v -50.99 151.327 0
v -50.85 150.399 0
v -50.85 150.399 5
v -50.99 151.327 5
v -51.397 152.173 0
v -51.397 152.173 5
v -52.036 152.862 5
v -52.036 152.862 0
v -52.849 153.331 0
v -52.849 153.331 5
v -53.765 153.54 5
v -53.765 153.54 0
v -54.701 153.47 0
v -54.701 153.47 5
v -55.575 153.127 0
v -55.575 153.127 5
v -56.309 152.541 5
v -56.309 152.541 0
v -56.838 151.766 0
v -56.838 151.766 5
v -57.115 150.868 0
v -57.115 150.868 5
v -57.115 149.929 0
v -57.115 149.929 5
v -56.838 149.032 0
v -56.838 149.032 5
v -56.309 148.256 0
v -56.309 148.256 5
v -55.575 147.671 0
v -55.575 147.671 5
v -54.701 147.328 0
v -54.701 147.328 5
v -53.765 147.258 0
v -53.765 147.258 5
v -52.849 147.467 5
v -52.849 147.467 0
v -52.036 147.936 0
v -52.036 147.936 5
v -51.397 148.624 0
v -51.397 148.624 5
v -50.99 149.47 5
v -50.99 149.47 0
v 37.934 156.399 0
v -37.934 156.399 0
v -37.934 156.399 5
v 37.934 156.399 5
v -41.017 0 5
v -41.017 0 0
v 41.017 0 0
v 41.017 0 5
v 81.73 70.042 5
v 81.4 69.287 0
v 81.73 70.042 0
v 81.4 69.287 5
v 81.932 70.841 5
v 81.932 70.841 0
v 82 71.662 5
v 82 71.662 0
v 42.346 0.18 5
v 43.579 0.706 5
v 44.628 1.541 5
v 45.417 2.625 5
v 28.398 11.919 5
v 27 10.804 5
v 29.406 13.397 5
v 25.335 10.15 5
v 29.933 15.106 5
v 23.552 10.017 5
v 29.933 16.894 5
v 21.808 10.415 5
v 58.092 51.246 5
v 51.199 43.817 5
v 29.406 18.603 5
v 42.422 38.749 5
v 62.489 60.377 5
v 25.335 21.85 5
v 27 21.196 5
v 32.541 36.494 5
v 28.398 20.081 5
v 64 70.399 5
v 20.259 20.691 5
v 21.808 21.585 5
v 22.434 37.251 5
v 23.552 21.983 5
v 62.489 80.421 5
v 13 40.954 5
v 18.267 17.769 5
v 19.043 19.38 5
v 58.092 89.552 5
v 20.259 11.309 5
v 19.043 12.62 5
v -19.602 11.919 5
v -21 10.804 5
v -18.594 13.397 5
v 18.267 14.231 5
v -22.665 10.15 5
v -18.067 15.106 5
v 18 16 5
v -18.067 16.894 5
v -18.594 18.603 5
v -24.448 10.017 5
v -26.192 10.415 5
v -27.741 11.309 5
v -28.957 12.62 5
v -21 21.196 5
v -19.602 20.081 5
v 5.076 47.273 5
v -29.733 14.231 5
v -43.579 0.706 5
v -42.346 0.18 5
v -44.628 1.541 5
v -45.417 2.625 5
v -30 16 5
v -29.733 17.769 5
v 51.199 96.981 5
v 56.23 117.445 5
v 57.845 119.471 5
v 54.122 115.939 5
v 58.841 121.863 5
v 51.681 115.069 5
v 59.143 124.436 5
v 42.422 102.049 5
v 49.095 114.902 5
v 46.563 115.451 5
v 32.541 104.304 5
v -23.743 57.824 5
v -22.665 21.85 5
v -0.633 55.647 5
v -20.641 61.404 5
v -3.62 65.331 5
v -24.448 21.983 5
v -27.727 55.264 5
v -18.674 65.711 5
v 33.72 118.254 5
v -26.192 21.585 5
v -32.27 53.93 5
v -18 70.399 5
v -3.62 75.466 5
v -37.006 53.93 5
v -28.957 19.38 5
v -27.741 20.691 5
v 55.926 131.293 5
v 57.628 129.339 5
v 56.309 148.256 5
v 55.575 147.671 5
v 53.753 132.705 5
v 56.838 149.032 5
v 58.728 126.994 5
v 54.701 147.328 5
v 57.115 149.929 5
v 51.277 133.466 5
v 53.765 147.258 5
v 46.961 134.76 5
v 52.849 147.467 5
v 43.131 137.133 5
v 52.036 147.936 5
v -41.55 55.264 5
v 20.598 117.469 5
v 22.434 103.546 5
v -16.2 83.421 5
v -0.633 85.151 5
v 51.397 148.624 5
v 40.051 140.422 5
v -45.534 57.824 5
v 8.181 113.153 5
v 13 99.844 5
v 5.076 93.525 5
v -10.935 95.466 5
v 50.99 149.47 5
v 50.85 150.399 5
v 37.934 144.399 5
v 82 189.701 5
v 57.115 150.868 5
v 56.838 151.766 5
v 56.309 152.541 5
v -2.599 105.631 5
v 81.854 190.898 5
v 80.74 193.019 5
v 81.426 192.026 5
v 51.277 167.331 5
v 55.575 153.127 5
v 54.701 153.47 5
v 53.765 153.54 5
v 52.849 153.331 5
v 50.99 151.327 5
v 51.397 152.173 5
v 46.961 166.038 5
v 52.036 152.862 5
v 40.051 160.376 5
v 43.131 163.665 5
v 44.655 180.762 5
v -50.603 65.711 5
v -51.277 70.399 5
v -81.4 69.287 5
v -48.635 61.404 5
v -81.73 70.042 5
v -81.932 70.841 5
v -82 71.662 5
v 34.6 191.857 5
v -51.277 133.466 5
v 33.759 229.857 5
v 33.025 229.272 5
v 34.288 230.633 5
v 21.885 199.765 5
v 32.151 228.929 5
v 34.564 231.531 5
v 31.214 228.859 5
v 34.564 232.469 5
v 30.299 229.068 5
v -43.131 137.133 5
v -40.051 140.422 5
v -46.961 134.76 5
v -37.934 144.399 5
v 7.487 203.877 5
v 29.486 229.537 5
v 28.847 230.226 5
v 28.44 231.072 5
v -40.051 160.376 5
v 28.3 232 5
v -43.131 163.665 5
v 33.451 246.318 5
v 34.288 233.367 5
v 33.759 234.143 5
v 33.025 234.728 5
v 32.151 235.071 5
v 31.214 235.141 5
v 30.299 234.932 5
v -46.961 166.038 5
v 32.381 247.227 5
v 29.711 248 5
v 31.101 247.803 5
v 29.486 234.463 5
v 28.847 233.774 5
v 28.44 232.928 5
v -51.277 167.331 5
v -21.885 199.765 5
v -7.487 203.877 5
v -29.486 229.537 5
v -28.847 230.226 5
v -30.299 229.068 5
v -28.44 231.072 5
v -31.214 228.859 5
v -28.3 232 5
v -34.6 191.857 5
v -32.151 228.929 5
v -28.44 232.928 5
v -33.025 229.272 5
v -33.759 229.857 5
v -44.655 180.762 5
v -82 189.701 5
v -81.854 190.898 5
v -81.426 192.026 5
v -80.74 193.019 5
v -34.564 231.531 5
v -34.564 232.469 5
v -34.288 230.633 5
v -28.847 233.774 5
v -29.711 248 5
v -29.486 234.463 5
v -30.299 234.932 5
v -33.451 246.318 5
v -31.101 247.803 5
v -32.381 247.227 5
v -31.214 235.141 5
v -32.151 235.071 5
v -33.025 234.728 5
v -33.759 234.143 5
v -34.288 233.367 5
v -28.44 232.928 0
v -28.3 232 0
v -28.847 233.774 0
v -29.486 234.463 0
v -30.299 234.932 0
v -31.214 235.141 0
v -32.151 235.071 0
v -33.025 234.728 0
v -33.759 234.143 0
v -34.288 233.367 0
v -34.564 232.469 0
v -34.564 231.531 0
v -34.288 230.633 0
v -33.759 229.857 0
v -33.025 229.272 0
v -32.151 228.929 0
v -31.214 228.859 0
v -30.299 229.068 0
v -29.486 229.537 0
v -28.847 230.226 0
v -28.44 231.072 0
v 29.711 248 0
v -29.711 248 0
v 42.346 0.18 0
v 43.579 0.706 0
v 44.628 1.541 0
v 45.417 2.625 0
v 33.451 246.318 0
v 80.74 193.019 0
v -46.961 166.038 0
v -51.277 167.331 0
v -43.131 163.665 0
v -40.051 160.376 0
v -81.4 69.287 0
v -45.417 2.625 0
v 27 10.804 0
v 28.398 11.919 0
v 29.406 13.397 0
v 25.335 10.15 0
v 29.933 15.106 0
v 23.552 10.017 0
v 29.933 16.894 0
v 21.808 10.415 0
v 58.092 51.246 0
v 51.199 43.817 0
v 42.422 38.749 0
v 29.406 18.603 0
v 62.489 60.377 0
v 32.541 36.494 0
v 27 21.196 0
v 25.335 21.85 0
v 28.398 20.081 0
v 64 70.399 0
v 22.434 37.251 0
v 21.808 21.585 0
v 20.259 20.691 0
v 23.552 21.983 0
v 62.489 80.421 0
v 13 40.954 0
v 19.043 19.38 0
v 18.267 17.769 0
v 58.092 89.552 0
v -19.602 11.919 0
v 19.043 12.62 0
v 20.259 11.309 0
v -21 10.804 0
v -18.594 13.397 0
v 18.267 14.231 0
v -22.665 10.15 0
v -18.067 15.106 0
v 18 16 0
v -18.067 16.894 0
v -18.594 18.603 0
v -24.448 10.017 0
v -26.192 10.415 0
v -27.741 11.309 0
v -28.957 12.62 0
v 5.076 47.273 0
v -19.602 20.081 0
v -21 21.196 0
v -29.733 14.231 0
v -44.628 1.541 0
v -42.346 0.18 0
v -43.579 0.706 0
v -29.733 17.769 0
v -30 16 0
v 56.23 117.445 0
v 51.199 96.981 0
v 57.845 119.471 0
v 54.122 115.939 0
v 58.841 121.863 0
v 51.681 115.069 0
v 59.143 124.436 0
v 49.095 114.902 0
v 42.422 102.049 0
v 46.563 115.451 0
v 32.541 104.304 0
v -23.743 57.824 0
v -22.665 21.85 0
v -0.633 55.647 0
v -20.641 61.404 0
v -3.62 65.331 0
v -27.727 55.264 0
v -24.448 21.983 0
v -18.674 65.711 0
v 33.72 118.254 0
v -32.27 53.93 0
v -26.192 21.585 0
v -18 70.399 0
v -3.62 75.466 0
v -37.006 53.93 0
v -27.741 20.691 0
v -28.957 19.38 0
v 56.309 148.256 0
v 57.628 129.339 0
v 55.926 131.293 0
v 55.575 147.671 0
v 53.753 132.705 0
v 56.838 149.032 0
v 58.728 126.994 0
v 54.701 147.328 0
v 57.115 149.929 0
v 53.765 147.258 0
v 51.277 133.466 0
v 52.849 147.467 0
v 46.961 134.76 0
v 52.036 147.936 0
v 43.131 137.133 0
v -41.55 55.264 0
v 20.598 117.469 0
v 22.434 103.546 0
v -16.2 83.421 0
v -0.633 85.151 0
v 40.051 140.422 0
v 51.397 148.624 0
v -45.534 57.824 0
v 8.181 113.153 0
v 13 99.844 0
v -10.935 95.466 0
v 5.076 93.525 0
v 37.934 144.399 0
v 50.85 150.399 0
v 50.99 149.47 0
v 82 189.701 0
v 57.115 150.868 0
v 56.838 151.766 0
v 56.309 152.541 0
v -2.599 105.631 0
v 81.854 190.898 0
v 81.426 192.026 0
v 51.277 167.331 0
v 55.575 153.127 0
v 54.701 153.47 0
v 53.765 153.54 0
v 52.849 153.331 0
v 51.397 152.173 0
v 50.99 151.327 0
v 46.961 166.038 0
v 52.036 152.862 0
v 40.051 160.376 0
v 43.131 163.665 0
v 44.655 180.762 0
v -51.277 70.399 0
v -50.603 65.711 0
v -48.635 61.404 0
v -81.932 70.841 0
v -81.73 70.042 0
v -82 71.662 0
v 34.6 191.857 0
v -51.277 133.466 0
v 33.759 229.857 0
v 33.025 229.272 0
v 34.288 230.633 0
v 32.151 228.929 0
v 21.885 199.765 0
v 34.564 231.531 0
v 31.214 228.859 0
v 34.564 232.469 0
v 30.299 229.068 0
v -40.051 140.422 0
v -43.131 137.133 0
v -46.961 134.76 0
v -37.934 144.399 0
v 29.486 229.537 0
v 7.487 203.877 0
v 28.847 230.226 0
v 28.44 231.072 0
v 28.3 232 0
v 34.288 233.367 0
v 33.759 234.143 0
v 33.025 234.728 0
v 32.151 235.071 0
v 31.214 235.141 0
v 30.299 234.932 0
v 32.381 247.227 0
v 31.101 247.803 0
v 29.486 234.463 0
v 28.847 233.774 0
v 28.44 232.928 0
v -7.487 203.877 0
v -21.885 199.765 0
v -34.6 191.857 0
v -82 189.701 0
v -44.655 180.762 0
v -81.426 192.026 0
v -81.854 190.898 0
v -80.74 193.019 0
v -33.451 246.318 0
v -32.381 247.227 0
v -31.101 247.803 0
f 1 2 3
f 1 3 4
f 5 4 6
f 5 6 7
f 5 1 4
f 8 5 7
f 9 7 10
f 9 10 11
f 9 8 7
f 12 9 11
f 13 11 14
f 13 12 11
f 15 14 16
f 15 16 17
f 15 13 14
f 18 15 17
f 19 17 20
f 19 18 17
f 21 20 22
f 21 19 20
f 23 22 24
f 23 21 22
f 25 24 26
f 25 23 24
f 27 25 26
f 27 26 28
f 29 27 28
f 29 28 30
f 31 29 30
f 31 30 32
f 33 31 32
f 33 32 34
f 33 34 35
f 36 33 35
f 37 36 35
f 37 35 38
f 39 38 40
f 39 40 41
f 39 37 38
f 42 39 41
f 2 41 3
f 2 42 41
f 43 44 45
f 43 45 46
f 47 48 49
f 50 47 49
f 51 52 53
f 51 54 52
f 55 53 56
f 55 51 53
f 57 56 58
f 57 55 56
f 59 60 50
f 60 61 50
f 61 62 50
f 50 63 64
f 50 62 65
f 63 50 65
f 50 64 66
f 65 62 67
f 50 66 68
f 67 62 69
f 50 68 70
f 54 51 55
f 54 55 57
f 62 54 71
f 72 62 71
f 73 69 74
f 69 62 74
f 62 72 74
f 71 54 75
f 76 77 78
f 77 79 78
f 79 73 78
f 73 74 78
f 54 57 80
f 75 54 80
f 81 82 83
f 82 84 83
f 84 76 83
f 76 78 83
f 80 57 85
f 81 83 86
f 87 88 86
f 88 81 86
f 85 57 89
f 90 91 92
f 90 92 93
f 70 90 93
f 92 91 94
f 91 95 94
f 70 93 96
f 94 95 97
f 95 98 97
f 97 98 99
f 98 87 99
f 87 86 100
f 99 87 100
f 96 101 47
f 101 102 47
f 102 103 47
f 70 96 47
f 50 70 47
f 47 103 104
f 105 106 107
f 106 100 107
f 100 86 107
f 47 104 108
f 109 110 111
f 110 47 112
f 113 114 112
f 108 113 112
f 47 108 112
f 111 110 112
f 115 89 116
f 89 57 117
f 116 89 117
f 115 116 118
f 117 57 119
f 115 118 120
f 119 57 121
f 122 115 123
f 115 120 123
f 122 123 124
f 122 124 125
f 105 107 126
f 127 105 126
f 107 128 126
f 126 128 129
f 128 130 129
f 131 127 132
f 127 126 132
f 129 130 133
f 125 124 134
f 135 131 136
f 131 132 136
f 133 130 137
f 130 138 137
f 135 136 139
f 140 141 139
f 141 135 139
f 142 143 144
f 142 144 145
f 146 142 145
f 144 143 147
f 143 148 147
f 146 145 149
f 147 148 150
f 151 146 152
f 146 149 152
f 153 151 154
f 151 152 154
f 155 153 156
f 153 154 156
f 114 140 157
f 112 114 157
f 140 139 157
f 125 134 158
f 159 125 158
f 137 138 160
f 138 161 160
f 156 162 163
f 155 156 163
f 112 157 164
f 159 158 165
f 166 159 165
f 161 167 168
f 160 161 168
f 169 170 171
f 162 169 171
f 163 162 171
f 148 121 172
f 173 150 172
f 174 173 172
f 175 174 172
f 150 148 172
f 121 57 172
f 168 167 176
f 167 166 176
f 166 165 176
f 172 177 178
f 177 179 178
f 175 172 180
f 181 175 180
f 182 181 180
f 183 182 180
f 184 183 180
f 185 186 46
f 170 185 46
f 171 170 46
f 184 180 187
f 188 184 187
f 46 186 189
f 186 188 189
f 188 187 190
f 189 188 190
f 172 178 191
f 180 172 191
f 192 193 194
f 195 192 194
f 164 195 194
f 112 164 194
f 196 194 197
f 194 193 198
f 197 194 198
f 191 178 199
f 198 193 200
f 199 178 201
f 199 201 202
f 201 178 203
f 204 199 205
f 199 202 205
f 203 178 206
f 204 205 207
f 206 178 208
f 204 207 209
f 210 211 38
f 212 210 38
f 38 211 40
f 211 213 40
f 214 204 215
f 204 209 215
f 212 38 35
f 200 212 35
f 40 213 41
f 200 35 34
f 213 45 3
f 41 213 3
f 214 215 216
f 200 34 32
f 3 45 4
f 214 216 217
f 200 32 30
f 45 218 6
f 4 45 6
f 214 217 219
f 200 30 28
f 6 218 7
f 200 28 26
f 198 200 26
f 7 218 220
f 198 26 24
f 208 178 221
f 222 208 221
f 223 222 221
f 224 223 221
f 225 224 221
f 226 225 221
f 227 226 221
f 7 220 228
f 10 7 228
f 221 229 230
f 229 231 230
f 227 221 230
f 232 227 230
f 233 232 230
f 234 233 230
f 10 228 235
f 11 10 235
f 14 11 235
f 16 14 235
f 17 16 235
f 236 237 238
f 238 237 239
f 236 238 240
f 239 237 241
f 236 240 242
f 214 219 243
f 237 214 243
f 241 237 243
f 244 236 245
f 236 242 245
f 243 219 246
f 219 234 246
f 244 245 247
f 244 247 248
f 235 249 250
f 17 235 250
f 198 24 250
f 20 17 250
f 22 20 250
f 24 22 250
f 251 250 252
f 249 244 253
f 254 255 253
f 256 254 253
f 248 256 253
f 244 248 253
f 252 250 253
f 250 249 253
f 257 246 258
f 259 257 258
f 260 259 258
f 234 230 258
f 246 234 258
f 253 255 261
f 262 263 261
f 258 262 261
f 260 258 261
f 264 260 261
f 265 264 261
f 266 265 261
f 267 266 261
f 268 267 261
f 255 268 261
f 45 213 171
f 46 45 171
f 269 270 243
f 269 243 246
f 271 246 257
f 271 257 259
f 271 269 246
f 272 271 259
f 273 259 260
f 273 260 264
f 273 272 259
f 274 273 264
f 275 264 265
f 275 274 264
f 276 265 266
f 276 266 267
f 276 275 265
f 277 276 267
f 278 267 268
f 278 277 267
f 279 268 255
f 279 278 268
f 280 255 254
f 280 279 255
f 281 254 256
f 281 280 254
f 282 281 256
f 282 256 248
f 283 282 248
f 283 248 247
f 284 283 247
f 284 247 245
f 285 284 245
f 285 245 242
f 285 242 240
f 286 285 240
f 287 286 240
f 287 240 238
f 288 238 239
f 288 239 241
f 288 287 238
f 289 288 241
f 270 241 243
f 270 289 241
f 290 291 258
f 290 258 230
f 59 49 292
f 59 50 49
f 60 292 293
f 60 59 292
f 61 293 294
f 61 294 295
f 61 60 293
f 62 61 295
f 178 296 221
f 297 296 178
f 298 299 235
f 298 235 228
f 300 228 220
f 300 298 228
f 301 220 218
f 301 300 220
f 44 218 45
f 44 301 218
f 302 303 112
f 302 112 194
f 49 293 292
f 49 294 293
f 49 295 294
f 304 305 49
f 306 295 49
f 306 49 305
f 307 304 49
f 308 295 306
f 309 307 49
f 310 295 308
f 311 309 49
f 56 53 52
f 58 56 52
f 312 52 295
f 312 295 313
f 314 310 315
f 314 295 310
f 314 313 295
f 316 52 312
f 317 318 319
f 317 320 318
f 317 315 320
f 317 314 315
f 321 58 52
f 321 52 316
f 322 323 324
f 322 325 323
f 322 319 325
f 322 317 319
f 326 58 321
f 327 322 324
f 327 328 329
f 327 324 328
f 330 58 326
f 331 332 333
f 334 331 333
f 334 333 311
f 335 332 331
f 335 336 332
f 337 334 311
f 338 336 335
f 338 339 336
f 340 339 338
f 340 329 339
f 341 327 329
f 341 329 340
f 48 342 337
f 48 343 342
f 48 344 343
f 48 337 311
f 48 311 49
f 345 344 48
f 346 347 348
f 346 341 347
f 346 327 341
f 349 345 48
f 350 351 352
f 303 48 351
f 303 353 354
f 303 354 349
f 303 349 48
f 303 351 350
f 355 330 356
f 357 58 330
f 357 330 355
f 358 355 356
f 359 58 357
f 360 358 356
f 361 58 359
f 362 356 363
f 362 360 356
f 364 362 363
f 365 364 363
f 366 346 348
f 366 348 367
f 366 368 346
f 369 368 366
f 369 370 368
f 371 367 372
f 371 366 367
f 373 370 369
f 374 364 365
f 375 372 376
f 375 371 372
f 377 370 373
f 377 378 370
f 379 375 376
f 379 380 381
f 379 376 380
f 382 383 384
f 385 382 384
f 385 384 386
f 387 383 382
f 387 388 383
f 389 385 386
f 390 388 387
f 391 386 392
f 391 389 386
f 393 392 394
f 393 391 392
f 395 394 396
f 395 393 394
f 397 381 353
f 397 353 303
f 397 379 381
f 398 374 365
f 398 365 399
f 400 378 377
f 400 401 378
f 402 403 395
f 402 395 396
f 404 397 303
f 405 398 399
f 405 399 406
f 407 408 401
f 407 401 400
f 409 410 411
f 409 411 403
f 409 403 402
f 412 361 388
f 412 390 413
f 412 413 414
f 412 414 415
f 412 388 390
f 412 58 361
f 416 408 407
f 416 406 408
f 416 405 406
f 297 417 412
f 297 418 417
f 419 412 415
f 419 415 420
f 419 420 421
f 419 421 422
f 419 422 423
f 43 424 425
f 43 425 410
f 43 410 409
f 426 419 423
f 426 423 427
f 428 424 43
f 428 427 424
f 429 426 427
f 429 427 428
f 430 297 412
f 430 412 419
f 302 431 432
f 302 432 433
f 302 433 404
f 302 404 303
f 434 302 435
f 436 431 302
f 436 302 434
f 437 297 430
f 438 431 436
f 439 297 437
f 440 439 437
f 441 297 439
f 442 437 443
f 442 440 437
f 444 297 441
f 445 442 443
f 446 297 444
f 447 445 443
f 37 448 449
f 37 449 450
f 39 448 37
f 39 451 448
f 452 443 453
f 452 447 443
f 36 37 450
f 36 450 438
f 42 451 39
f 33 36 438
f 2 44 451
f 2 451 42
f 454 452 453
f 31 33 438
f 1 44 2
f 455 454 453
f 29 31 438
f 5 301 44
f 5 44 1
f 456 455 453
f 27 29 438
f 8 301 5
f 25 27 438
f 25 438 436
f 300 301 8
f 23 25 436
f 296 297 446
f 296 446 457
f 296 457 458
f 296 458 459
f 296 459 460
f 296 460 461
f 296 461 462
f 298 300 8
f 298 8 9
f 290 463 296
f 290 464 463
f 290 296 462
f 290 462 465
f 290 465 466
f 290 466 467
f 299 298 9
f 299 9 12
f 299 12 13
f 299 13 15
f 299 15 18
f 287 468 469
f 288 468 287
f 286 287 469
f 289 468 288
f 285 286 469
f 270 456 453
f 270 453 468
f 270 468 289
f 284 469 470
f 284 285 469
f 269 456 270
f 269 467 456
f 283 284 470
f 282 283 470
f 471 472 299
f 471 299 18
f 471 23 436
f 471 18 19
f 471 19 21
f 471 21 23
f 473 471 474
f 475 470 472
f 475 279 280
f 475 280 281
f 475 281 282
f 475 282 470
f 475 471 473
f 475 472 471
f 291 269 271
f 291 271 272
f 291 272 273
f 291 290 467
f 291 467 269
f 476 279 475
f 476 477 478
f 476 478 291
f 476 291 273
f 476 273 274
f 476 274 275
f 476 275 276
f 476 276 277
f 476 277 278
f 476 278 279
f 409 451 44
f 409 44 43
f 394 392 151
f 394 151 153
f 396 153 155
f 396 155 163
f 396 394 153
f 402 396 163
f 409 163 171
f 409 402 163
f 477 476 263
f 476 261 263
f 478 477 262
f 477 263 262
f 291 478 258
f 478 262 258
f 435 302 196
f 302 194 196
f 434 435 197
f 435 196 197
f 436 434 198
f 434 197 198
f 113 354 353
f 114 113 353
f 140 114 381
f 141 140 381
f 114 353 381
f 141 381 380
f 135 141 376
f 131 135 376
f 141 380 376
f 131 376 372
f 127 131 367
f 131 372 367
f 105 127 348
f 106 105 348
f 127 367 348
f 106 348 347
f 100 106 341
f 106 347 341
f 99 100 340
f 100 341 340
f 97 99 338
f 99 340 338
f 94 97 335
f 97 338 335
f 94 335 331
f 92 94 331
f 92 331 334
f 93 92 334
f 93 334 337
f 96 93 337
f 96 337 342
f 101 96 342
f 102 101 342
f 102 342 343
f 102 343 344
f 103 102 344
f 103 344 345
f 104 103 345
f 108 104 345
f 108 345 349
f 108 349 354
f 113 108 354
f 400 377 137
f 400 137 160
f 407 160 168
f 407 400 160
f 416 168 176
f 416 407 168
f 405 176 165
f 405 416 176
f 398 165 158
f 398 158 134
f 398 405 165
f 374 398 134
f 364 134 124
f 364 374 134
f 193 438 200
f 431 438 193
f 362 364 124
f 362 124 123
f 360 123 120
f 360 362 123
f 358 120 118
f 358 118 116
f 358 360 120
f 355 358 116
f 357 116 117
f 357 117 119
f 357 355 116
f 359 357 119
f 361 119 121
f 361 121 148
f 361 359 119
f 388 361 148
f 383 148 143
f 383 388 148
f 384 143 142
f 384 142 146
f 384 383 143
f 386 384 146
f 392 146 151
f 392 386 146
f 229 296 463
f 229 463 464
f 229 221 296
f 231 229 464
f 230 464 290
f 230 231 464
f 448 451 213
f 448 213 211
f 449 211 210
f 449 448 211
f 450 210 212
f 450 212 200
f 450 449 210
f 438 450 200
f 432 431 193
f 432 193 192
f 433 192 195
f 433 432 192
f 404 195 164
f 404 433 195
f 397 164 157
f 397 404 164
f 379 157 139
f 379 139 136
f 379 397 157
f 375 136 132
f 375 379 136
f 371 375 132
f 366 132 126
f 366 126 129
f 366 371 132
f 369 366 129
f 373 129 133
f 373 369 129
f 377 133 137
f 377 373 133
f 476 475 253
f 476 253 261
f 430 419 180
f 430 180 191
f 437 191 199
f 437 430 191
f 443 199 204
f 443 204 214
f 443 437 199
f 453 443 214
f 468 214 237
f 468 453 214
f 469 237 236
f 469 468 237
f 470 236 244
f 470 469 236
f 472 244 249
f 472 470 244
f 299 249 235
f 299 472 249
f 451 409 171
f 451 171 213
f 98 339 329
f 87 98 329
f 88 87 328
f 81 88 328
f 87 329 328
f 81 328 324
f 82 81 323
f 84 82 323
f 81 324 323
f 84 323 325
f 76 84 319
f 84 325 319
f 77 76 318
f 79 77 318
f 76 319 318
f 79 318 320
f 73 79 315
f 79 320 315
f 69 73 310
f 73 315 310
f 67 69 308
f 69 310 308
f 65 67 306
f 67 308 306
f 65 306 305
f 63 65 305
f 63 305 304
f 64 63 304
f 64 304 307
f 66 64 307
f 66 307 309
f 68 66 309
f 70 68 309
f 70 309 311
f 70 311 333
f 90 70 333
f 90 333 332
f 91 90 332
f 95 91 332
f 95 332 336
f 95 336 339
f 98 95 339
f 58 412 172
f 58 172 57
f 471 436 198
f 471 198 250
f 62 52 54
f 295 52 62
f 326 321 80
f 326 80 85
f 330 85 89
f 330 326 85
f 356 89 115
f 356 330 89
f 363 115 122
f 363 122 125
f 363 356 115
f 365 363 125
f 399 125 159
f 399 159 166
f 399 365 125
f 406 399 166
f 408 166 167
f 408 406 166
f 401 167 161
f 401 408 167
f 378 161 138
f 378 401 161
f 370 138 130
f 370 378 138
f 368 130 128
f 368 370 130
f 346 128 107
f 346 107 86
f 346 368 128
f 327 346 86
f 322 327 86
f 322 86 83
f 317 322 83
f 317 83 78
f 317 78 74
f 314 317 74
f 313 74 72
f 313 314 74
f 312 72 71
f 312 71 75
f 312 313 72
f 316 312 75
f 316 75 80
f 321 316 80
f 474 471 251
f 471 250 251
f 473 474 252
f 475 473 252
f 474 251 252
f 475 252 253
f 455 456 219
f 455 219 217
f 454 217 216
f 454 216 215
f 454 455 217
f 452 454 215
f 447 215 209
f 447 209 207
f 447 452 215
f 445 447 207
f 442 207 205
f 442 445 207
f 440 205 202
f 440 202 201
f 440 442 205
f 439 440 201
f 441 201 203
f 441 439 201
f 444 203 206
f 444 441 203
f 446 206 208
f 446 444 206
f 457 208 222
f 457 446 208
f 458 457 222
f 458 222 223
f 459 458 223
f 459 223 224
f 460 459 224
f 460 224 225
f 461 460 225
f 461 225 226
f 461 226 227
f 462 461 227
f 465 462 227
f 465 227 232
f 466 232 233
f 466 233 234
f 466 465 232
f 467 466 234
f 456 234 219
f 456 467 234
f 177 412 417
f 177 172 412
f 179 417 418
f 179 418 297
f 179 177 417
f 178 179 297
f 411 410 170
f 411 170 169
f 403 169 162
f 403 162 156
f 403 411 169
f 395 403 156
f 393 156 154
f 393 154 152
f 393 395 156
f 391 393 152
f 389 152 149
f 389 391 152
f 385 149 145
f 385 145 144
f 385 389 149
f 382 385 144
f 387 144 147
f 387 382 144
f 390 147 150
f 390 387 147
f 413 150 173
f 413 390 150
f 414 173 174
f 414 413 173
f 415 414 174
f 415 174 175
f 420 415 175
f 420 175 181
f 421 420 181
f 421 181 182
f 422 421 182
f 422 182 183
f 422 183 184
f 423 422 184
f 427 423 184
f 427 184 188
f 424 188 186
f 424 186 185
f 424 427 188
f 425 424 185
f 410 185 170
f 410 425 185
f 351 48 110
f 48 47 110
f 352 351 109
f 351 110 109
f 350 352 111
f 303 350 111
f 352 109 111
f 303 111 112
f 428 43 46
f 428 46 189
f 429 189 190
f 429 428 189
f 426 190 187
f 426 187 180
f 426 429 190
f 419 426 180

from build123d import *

# Parameters (mm, degrees)
SKETCH1_R           = 3.15
SKETCH1_R_2         = 34
BOSS_EXTRUDE2_DEPTH = 5
FILLET1_R           = 5
SKETCH2_R           = 6
CUT_EXTRUDE1_DEPTH  = 262.252751182


with BuildPart() as part:
    # Sketch1 → Boss-Extrude2 (new body)
    with BuildSketch(Plane.XY):
        Polygon((0, 0), (-44, 0), (-82, 70.398863627), (-82, 191.598863627), (-31.959298408, 248), (31.959298408, 248), (82, 191.598863627), (82, 70.398863627), (44, 0), align=None)
        with Locations((-31.449578633, 232)):
            Circle(SKETCH1_R, mode=Mode.SUBTRACT)
        with Locations((-24, 16)):
            Circle(SKETCH1_R, mode=Mode.SUBTRACT)
        with Locations((-54, 150.398863627)):
            Circle(SKETCH1_R, mode=Mode.SUBTRACT)
        with Locations(Location((24, 16, 0), (0, 0, 180))):
            Circle(SKETCH1_R, mode=Mode.SUBTRACT)
        with Locations(Location((31.449578633, 232, 0), (0, 0, 180))):
            Circle(SKETCH1_R, mode=Mode.SUBTRACT)
        with Locations(Location((54, 150.398863627, 0), (0, 0, 180))):
            Circle(SKETCH1_R, mode=Mode.SUBTRACT)
        with Locations((30, 70.398863627)):
            Circle(SKETCH1_R_2, mode=Mode.SUBTRACT)
        with BuildLine():
            Line((-37.93380879, 156.398863627), (37.93380879, 156.398863627))
            ThreePointArc((37.93380879, 156.398863627), (43.130728491, 163.664663146), (51.276643519, 167.331253579))
            ThreePointArc((51.276643519, 167.331253579), (0, 204.398863627), (-51.276643519, 167.331253579))
            ThreePointArc((-51.276643519, 167.331253579), (-43.130728491, 163.664663146), (-37.93380879, 156.398863627))
        make_face(mode=Mode.SUBTRACT)
        with BuildLine():
            Line((-51.276643519, 133.466473676), (-51.276643519, 70.398863627))
            ThreePointArc((-51.276643519, 70.398863627), (-34.638321759, 53.760541868), (-18, 70.398863627))
            ThreePointArc((-18, 70.398863627), (2.532150776, 109.762771703), (46.563219124, 115.450609123))
            ThreePointArc((46.563219124, 115.450609123), (58.841139814, 121.862892104), (51.276643519, 133.466473676))
            ThreePointArc((51.276643519, 133.466473676), (43.130728491, 137.133064108), (37.93380879, 144.398863627))
            Line((37.93380879, 144.398863627), (-37.93380879, 144.398863627))
            ThreePointArc((-37.93380879, 144.398863627), (-43.130728491, 137.133064108), (-51.276643519, 133.466473676))
        make_face(mode=Mode.SUBTRACT)
    extrude(amount=BOSS_EXTRUDE2_DEPTH)

    # Fillet1
    fillet1_edges = [part.edges().sort_by_distance(p)[0] for p in [
        (-44, 0, 2.5),
        (-82, 70.398863627, 2.5),
        (-82, 191.598863627, 2.5),
        (-31.959298408, 248, 2.5),
        (31.959298408, 248, 2.5),
        (82, 191.598863627, 2.5),
        (82, 70.398863627, 2.5),
        (44, 0, 2.5),
    ]]
    fillet(fillet1_edges, radius=FILLET1_R)

    # Sketch2 → Cut-Extrude1 (cut, through all)
    with BuildSketch(Plane(origin=(0, 0, 0), x_dir=(-1, 0, 0), z_dir=(0, 0, -1))):
        with Locations((24, 16)):
            Circle(SKETCH2_R)
        with Locations((-24, 16)):
            Circle(SKETCH2_R)
    extrude(amount=-CUT_EXTRUDE1_DEPTH, mode=Mode.SUBTRACT)


solid = part.part
